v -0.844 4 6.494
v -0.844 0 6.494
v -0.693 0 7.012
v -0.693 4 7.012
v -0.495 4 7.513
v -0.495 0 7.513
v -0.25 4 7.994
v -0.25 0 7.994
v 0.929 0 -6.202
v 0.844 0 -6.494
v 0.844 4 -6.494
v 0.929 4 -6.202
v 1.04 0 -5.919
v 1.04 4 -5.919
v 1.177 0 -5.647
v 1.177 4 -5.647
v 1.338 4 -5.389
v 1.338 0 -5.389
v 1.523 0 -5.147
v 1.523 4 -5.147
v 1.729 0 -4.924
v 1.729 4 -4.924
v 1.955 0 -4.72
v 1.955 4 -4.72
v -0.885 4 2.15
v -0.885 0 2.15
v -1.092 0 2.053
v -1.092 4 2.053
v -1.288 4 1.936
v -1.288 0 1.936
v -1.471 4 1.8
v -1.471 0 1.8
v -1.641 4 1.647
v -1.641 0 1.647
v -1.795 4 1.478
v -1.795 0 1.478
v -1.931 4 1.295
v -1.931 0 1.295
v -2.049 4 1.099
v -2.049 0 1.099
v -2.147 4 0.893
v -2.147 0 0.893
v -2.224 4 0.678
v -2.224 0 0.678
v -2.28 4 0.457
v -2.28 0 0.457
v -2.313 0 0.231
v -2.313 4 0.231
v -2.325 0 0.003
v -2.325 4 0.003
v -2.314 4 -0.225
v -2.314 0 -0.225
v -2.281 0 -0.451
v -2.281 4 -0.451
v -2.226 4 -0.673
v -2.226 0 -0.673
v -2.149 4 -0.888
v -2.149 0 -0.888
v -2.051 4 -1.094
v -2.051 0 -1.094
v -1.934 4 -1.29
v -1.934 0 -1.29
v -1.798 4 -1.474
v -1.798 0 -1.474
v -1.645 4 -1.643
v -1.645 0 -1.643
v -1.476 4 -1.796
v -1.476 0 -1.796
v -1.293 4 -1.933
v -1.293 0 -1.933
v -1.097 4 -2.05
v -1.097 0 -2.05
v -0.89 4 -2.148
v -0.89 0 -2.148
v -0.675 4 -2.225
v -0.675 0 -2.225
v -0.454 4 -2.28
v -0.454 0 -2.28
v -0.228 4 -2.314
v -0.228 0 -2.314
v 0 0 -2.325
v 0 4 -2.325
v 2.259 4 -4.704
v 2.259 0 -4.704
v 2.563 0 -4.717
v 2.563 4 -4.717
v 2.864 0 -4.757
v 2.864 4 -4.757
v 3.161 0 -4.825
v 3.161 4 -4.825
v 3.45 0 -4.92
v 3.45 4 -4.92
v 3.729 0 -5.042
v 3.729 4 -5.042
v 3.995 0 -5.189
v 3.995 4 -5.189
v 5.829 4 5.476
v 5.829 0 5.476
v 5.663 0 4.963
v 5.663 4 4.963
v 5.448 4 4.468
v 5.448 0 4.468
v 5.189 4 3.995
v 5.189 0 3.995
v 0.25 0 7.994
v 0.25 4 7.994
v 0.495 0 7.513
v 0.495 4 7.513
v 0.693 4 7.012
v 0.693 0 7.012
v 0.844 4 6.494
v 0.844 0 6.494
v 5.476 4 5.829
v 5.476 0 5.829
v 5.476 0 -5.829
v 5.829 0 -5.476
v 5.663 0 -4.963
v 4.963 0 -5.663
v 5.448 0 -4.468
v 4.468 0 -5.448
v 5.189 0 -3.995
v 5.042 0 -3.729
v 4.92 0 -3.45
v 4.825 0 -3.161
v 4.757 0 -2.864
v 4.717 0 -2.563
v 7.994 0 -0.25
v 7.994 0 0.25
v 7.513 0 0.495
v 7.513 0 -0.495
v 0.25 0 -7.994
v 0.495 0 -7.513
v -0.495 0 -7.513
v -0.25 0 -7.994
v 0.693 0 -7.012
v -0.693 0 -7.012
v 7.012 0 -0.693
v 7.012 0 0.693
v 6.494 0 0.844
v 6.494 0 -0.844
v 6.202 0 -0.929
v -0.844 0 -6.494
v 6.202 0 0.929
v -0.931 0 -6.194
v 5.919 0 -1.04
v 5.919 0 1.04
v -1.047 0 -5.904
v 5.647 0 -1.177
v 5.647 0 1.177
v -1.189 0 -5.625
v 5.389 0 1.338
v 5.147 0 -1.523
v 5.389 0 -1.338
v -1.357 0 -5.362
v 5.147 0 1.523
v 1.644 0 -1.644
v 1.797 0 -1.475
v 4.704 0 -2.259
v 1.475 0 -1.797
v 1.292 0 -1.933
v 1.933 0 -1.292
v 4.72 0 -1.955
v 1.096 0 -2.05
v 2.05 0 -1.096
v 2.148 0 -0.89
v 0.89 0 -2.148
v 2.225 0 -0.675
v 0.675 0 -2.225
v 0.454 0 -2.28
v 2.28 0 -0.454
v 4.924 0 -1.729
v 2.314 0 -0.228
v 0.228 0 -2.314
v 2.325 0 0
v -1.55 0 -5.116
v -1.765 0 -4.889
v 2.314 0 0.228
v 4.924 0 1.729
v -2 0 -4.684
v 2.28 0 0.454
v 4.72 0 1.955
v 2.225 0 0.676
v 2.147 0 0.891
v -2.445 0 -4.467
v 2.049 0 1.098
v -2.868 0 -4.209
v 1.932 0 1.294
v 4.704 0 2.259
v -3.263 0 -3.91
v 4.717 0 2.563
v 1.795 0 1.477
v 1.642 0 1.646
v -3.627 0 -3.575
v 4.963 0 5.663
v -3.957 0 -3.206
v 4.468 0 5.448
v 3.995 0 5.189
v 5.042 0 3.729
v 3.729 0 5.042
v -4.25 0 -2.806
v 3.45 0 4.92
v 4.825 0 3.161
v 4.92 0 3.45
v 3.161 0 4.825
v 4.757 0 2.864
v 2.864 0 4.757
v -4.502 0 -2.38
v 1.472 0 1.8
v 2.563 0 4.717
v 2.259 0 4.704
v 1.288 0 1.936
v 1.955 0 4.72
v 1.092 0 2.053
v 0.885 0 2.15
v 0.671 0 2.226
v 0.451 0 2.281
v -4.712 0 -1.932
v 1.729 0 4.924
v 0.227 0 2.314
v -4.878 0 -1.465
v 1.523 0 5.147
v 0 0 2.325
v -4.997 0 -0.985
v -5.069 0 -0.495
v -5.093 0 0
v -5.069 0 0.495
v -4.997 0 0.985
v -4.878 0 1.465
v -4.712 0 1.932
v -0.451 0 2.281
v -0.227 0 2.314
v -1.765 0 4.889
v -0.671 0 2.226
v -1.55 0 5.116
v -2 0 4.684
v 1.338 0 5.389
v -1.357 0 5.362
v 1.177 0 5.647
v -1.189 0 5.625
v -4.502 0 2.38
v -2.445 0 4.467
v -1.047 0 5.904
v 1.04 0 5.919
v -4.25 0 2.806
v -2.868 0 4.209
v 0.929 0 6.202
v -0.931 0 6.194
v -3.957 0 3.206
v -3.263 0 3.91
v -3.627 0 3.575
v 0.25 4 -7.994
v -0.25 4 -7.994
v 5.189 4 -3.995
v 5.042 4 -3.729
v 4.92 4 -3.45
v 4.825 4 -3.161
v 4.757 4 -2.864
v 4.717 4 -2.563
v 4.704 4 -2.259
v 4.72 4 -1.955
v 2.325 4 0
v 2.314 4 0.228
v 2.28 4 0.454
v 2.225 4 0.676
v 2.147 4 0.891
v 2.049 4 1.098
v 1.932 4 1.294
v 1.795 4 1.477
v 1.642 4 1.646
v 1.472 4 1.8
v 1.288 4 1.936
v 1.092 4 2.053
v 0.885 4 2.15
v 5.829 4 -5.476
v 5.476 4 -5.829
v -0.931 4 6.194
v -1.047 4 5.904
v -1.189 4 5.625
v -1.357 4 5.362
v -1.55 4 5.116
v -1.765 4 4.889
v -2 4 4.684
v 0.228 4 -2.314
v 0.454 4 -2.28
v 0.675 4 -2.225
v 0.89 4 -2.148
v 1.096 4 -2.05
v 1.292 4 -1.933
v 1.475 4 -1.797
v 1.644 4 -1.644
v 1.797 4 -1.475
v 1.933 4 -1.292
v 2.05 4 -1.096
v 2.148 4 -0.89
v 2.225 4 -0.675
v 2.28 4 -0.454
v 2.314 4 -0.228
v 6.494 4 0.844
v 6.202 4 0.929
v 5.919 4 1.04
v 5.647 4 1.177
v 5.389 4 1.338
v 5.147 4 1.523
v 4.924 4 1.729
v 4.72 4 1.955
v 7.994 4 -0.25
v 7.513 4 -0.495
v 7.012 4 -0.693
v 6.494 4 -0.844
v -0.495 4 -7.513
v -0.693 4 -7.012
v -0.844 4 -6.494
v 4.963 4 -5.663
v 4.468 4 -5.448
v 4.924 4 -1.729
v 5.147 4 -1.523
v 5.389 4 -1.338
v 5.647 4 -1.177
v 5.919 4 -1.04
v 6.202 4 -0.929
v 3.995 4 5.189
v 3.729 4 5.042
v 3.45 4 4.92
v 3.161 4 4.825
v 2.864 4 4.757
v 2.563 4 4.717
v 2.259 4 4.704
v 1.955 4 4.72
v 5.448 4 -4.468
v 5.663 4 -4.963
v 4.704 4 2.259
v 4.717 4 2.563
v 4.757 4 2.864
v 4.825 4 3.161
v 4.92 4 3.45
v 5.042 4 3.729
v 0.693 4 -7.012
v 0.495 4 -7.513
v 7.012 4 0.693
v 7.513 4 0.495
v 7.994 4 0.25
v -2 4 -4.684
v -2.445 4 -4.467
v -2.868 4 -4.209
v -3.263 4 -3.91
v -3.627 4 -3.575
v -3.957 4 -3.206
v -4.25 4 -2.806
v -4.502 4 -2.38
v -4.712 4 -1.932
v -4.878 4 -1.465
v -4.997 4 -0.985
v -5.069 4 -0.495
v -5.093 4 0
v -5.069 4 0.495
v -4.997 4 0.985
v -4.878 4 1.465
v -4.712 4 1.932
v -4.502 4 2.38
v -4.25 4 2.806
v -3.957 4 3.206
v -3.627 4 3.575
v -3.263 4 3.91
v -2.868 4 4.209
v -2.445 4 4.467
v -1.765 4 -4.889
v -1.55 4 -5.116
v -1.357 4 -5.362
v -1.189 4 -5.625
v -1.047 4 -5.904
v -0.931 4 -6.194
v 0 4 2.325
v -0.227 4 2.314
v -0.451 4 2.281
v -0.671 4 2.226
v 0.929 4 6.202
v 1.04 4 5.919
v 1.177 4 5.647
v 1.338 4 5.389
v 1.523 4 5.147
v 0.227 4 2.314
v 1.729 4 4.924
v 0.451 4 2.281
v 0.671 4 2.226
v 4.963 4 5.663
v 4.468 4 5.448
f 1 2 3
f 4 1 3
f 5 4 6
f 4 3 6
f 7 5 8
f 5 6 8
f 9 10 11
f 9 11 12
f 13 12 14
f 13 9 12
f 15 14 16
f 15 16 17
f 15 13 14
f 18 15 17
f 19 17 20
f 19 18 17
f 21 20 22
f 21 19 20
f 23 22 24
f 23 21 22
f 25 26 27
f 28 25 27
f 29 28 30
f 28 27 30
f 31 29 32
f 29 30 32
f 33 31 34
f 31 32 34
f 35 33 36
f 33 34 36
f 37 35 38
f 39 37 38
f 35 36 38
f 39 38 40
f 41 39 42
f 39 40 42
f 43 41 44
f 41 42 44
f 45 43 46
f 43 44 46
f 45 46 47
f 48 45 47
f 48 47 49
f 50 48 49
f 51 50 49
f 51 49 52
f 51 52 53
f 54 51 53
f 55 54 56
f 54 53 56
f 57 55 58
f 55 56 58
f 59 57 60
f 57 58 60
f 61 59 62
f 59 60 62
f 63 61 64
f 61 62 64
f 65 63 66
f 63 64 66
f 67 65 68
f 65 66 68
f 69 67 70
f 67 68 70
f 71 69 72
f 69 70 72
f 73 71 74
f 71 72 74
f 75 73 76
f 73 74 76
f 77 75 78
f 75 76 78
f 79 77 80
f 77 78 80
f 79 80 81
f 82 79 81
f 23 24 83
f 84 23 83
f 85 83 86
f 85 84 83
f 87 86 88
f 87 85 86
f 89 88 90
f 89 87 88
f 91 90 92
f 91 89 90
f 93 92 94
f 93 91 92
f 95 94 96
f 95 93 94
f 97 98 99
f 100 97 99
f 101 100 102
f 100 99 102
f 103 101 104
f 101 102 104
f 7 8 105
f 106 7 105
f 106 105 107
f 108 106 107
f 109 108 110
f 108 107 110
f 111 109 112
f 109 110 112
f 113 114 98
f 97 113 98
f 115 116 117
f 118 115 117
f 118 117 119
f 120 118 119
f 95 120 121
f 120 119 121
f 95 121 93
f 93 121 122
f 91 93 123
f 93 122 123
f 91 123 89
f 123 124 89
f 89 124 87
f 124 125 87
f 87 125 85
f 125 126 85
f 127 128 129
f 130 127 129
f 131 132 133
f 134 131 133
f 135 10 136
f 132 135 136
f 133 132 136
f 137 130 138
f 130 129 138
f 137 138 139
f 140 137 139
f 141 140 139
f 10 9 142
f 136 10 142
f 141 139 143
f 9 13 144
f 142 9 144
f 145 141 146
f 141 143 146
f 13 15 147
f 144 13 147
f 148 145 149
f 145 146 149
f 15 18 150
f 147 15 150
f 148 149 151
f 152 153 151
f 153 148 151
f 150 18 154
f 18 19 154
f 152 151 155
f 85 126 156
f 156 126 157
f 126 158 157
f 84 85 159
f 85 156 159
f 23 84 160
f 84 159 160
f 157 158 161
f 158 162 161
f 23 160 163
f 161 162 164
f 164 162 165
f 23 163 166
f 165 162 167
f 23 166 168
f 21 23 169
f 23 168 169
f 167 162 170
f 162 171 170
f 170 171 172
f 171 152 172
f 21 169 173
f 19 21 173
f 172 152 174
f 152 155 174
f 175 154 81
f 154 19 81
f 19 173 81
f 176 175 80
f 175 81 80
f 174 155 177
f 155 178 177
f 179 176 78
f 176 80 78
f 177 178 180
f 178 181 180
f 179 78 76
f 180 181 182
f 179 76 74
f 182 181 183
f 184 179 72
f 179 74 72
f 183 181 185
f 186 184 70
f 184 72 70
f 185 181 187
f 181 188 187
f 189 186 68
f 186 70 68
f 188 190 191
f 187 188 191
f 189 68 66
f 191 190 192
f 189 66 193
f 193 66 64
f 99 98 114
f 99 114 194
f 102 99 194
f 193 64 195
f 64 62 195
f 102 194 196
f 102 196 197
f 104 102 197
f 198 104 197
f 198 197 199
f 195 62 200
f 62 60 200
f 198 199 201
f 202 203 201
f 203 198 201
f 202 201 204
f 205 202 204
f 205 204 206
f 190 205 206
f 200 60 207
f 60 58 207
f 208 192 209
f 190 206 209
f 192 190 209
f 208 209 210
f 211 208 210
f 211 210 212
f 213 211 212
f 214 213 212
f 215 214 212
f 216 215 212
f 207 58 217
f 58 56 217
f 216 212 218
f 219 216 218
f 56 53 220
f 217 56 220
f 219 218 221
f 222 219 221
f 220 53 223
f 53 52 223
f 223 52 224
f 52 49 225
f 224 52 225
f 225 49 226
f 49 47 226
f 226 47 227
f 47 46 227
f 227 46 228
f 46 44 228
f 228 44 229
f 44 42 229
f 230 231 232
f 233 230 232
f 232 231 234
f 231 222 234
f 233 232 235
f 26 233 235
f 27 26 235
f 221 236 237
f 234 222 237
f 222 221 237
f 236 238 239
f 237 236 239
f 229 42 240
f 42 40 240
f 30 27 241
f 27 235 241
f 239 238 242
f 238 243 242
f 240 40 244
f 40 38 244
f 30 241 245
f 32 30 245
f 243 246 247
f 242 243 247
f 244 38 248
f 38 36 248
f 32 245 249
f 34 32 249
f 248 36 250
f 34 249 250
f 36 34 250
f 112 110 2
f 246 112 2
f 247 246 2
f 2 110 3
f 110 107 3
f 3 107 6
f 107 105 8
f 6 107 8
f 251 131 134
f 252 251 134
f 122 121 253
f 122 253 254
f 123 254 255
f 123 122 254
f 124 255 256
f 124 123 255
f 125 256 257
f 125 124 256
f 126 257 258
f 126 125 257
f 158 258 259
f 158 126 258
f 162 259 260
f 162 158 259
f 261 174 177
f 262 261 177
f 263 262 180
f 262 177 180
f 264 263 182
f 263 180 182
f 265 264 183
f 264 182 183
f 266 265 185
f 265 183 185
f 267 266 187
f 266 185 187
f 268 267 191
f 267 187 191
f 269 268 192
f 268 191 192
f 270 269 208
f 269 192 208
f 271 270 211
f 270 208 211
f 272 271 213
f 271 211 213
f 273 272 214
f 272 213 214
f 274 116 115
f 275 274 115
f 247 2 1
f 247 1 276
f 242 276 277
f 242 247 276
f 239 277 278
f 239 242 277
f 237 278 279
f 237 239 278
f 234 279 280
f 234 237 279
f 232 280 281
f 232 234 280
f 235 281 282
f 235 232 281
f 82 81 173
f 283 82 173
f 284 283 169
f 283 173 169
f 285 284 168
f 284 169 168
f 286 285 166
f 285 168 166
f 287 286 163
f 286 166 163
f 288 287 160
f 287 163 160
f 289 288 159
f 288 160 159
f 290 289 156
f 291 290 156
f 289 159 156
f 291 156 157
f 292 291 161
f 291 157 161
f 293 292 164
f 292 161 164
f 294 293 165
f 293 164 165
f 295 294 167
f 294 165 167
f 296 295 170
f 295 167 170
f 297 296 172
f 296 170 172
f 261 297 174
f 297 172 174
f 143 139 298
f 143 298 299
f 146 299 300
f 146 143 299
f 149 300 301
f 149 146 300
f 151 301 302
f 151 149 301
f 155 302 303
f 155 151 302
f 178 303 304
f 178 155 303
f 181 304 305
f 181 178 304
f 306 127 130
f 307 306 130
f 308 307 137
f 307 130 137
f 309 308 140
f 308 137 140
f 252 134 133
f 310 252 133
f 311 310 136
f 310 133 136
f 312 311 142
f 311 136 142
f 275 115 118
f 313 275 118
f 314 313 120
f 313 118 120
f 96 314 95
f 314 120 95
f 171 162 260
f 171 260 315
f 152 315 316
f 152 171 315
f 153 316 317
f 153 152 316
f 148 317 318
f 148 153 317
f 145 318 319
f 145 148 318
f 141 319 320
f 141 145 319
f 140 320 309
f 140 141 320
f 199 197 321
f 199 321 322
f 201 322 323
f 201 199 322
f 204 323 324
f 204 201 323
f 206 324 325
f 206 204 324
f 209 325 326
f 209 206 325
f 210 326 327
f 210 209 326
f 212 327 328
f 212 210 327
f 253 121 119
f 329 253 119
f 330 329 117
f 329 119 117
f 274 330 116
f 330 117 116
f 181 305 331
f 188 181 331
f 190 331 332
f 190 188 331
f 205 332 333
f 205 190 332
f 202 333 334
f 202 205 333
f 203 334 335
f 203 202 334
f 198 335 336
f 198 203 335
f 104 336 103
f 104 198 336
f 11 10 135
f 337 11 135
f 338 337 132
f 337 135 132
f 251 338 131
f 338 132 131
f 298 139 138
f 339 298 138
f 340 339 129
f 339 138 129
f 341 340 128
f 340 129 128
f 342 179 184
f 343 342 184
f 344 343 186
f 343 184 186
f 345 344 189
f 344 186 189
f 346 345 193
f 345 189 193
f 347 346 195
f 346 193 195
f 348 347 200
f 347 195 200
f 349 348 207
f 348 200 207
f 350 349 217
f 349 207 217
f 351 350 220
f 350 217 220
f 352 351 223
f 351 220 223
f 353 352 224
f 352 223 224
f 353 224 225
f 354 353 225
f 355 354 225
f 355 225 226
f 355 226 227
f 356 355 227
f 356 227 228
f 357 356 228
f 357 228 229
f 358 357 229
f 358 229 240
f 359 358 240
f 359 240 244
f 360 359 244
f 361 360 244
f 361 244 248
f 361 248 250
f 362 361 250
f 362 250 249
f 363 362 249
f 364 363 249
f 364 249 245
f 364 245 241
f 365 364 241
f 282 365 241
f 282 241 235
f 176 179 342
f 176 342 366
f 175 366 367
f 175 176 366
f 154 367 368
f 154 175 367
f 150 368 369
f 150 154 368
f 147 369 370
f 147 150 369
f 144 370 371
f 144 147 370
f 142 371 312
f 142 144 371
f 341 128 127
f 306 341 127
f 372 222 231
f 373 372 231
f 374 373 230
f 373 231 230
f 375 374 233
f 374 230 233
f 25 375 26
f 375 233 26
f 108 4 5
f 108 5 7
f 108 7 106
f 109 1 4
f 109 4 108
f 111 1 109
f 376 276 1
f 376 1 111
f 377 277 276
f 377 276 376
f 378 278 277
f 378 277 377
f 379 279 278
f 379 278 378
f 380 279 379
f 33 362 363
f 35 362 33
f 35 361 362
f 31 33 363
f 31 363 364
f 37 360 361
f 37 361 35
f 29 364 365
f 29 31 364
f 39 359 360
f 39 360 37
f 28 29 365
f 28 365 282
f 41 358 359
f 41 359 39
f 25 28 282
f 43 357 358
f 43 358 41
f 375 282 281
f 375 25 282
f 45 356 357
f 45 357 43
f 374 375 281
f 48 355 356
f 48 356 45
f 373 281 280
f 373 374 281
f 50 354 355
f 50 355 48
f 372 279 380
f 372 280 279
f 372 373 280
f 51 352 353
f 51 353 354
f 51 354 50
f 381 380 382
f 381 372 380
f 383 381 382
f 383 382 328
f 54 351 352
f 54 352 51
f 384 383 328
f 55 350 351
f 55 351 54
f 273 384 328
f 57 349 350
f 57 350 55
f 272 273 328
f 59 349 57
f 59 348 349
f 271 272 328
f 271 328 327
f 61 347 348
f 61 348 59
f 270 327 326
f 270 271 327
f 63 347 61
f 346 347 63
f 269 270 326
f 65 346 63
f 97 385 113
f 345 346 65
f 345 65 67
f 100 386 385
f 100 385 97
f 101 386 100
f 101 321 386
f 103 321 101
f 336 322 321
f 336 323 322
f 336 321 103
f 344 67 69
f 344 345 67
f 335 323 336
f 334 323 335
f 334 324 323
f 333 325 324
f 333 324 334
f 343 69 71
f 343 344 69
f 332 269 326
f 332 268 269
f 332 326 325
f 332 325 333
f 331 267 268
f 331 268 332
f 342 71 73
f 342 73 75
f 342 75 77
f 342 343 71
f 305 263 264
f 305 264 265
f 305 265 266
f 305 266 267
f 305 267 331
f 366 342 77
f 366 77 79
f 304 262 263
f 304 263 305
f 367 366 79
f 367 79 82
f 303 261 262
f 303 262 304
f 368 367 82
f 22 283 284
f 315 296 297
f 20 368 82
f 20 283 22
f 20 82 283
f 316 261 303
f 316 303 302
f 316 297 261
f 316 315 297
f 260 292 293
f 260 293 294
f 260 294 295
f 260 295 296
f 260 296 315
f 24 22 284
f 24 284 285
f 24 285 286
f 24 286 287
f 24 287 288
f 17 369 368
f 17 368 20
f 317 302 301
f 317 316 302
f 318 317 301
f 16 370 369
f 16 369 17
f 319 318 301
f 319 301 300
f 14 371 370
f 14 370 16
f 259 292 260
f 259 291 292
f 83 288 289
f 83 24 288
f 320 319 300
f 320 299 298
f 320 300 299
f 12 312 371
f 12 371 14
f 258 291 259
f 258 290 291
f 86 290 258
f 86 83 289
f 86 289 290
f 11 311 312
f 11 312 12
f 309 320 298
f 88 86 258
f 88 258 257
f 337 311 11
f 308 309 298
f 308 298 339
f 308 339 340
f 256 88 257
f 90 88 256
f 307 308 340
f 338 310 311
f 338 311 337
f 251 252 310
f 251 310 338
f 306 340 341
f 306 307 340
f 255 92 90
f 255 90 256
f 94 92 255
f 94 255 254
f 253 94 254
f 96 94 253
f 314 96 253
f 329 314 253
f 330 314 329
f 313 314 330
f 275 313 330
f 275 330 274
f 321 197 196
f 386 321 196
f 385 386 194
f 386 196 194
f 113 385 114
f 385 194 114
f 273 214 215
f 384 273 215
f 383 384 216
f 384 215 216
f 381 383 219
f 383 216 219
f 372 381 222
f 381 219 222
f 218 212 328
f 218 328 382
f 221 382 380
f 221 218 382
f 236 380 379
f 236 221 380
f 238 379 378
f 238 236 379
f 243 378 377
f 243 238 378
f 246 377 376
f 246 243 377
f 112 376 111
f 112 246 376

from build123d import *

# Parameters (mm, degrees)
BOSS_EXTRUDE1_DEPTH = 4
CIRPATTERN2_COUNT   = 5
CIRPATTERN2_ANGLE   = 180
BOSS_EXTRUDE3_DEPTH = 4


with BuildPart() as part:
    # Sketch1 → Boss-Extrude1 (new body)
    with BuildSketch(Plane(origin=(0, 0, 0), x_dir=(1, 0, 0), z_dir=(0, 1, 0))):
        with BuildLine():
            Line((0.25, 7.99381848), (-0.25, 7.99381848))
            ThreePointArc((-0.25, 7.99381848), (-0.831305349, 6.545394817), (-1, 4.99381848))
            Line((-1, 4.99381848), (1, 4.99381848))
            ThreePointArc((1, 4.99381848), (0.831305349, 6.545394817), (0.25, 7.99381848))
        make_face()
        with BuildLine():
            Line((0, 6.49381848), (0.843945674, 6.49381848))
            ThreePointArc((0.843945674, 6.49381848), (1.27002788, 5.491773836), (2, 4.683825681))
            Line((2, 4.683825681), (-2, 4.683825681))
            ThreePointArc((-2, 4.683825681), (-1.27002788, 5.491773836), (-0.843945674, 6.49381848))
            Line((-0.843945674, 6.49381848), (0, 6.49381848))
        make_face()
    boss_extrude1 = extrude(amount=BOSS_EXTRUDE1_DEPTH)

    # CirPattern2: Boss-Extrude1 ×5 about axis
    cirpattern2_axis = Axis((0, 0, 0), (0, -1, 0))
    for i in range(1, CIRPATTERN2_COUNT):
        add(boss_extrude1.rotate(cirpattern2_axis, i * CIRPATTERN2_ANGLE / (CIRPATTERN2_COUNT - 1)))

    # Sketch1<5> → Boss-Extrude3 (add)
    with BuildSketch(Plane(origin=(0, 0, 0), x_dir=(1, 0, 0), z_dir=(0, 1, 0))):
        with BuildLine():
            ThreePointArc((5.092958179, 0), (4.249949374, 2.806448526), (2, 4.683825681))
            Line((2, 4.683825681), (-2, 4.683825681))
            ThreePointArc((-2, 4.683825681), (-2.806448526, -4.249949374), (5.092958179, 0))
        make_face()
        with BuildLine():
            ThreePointArc((0.884943501, -2.15), (0.451040464, -2.280830441), (0, -2.325))
            ThreePointArc((0, -2.325), (-0.451040464, -2.280830441), (-0.884943501, -2.15))
            ThreePointArc((-0.884943501, -2.15), (-2.280830441, 0.451040464), (0, 2.325))
            ThreePointArc((0, 2.325), (1.644023266, 1.644023266), (2.325, 0))
            ThreePointArc((2.325, 0), (1.931724442, -1.293856901), (0.884943501, -2.15))
        make_face(mode=Mode.SUBTRACT)
    extrude(amount=BOSS_EXTRUDE3_DEPTH)


solid = part.part
